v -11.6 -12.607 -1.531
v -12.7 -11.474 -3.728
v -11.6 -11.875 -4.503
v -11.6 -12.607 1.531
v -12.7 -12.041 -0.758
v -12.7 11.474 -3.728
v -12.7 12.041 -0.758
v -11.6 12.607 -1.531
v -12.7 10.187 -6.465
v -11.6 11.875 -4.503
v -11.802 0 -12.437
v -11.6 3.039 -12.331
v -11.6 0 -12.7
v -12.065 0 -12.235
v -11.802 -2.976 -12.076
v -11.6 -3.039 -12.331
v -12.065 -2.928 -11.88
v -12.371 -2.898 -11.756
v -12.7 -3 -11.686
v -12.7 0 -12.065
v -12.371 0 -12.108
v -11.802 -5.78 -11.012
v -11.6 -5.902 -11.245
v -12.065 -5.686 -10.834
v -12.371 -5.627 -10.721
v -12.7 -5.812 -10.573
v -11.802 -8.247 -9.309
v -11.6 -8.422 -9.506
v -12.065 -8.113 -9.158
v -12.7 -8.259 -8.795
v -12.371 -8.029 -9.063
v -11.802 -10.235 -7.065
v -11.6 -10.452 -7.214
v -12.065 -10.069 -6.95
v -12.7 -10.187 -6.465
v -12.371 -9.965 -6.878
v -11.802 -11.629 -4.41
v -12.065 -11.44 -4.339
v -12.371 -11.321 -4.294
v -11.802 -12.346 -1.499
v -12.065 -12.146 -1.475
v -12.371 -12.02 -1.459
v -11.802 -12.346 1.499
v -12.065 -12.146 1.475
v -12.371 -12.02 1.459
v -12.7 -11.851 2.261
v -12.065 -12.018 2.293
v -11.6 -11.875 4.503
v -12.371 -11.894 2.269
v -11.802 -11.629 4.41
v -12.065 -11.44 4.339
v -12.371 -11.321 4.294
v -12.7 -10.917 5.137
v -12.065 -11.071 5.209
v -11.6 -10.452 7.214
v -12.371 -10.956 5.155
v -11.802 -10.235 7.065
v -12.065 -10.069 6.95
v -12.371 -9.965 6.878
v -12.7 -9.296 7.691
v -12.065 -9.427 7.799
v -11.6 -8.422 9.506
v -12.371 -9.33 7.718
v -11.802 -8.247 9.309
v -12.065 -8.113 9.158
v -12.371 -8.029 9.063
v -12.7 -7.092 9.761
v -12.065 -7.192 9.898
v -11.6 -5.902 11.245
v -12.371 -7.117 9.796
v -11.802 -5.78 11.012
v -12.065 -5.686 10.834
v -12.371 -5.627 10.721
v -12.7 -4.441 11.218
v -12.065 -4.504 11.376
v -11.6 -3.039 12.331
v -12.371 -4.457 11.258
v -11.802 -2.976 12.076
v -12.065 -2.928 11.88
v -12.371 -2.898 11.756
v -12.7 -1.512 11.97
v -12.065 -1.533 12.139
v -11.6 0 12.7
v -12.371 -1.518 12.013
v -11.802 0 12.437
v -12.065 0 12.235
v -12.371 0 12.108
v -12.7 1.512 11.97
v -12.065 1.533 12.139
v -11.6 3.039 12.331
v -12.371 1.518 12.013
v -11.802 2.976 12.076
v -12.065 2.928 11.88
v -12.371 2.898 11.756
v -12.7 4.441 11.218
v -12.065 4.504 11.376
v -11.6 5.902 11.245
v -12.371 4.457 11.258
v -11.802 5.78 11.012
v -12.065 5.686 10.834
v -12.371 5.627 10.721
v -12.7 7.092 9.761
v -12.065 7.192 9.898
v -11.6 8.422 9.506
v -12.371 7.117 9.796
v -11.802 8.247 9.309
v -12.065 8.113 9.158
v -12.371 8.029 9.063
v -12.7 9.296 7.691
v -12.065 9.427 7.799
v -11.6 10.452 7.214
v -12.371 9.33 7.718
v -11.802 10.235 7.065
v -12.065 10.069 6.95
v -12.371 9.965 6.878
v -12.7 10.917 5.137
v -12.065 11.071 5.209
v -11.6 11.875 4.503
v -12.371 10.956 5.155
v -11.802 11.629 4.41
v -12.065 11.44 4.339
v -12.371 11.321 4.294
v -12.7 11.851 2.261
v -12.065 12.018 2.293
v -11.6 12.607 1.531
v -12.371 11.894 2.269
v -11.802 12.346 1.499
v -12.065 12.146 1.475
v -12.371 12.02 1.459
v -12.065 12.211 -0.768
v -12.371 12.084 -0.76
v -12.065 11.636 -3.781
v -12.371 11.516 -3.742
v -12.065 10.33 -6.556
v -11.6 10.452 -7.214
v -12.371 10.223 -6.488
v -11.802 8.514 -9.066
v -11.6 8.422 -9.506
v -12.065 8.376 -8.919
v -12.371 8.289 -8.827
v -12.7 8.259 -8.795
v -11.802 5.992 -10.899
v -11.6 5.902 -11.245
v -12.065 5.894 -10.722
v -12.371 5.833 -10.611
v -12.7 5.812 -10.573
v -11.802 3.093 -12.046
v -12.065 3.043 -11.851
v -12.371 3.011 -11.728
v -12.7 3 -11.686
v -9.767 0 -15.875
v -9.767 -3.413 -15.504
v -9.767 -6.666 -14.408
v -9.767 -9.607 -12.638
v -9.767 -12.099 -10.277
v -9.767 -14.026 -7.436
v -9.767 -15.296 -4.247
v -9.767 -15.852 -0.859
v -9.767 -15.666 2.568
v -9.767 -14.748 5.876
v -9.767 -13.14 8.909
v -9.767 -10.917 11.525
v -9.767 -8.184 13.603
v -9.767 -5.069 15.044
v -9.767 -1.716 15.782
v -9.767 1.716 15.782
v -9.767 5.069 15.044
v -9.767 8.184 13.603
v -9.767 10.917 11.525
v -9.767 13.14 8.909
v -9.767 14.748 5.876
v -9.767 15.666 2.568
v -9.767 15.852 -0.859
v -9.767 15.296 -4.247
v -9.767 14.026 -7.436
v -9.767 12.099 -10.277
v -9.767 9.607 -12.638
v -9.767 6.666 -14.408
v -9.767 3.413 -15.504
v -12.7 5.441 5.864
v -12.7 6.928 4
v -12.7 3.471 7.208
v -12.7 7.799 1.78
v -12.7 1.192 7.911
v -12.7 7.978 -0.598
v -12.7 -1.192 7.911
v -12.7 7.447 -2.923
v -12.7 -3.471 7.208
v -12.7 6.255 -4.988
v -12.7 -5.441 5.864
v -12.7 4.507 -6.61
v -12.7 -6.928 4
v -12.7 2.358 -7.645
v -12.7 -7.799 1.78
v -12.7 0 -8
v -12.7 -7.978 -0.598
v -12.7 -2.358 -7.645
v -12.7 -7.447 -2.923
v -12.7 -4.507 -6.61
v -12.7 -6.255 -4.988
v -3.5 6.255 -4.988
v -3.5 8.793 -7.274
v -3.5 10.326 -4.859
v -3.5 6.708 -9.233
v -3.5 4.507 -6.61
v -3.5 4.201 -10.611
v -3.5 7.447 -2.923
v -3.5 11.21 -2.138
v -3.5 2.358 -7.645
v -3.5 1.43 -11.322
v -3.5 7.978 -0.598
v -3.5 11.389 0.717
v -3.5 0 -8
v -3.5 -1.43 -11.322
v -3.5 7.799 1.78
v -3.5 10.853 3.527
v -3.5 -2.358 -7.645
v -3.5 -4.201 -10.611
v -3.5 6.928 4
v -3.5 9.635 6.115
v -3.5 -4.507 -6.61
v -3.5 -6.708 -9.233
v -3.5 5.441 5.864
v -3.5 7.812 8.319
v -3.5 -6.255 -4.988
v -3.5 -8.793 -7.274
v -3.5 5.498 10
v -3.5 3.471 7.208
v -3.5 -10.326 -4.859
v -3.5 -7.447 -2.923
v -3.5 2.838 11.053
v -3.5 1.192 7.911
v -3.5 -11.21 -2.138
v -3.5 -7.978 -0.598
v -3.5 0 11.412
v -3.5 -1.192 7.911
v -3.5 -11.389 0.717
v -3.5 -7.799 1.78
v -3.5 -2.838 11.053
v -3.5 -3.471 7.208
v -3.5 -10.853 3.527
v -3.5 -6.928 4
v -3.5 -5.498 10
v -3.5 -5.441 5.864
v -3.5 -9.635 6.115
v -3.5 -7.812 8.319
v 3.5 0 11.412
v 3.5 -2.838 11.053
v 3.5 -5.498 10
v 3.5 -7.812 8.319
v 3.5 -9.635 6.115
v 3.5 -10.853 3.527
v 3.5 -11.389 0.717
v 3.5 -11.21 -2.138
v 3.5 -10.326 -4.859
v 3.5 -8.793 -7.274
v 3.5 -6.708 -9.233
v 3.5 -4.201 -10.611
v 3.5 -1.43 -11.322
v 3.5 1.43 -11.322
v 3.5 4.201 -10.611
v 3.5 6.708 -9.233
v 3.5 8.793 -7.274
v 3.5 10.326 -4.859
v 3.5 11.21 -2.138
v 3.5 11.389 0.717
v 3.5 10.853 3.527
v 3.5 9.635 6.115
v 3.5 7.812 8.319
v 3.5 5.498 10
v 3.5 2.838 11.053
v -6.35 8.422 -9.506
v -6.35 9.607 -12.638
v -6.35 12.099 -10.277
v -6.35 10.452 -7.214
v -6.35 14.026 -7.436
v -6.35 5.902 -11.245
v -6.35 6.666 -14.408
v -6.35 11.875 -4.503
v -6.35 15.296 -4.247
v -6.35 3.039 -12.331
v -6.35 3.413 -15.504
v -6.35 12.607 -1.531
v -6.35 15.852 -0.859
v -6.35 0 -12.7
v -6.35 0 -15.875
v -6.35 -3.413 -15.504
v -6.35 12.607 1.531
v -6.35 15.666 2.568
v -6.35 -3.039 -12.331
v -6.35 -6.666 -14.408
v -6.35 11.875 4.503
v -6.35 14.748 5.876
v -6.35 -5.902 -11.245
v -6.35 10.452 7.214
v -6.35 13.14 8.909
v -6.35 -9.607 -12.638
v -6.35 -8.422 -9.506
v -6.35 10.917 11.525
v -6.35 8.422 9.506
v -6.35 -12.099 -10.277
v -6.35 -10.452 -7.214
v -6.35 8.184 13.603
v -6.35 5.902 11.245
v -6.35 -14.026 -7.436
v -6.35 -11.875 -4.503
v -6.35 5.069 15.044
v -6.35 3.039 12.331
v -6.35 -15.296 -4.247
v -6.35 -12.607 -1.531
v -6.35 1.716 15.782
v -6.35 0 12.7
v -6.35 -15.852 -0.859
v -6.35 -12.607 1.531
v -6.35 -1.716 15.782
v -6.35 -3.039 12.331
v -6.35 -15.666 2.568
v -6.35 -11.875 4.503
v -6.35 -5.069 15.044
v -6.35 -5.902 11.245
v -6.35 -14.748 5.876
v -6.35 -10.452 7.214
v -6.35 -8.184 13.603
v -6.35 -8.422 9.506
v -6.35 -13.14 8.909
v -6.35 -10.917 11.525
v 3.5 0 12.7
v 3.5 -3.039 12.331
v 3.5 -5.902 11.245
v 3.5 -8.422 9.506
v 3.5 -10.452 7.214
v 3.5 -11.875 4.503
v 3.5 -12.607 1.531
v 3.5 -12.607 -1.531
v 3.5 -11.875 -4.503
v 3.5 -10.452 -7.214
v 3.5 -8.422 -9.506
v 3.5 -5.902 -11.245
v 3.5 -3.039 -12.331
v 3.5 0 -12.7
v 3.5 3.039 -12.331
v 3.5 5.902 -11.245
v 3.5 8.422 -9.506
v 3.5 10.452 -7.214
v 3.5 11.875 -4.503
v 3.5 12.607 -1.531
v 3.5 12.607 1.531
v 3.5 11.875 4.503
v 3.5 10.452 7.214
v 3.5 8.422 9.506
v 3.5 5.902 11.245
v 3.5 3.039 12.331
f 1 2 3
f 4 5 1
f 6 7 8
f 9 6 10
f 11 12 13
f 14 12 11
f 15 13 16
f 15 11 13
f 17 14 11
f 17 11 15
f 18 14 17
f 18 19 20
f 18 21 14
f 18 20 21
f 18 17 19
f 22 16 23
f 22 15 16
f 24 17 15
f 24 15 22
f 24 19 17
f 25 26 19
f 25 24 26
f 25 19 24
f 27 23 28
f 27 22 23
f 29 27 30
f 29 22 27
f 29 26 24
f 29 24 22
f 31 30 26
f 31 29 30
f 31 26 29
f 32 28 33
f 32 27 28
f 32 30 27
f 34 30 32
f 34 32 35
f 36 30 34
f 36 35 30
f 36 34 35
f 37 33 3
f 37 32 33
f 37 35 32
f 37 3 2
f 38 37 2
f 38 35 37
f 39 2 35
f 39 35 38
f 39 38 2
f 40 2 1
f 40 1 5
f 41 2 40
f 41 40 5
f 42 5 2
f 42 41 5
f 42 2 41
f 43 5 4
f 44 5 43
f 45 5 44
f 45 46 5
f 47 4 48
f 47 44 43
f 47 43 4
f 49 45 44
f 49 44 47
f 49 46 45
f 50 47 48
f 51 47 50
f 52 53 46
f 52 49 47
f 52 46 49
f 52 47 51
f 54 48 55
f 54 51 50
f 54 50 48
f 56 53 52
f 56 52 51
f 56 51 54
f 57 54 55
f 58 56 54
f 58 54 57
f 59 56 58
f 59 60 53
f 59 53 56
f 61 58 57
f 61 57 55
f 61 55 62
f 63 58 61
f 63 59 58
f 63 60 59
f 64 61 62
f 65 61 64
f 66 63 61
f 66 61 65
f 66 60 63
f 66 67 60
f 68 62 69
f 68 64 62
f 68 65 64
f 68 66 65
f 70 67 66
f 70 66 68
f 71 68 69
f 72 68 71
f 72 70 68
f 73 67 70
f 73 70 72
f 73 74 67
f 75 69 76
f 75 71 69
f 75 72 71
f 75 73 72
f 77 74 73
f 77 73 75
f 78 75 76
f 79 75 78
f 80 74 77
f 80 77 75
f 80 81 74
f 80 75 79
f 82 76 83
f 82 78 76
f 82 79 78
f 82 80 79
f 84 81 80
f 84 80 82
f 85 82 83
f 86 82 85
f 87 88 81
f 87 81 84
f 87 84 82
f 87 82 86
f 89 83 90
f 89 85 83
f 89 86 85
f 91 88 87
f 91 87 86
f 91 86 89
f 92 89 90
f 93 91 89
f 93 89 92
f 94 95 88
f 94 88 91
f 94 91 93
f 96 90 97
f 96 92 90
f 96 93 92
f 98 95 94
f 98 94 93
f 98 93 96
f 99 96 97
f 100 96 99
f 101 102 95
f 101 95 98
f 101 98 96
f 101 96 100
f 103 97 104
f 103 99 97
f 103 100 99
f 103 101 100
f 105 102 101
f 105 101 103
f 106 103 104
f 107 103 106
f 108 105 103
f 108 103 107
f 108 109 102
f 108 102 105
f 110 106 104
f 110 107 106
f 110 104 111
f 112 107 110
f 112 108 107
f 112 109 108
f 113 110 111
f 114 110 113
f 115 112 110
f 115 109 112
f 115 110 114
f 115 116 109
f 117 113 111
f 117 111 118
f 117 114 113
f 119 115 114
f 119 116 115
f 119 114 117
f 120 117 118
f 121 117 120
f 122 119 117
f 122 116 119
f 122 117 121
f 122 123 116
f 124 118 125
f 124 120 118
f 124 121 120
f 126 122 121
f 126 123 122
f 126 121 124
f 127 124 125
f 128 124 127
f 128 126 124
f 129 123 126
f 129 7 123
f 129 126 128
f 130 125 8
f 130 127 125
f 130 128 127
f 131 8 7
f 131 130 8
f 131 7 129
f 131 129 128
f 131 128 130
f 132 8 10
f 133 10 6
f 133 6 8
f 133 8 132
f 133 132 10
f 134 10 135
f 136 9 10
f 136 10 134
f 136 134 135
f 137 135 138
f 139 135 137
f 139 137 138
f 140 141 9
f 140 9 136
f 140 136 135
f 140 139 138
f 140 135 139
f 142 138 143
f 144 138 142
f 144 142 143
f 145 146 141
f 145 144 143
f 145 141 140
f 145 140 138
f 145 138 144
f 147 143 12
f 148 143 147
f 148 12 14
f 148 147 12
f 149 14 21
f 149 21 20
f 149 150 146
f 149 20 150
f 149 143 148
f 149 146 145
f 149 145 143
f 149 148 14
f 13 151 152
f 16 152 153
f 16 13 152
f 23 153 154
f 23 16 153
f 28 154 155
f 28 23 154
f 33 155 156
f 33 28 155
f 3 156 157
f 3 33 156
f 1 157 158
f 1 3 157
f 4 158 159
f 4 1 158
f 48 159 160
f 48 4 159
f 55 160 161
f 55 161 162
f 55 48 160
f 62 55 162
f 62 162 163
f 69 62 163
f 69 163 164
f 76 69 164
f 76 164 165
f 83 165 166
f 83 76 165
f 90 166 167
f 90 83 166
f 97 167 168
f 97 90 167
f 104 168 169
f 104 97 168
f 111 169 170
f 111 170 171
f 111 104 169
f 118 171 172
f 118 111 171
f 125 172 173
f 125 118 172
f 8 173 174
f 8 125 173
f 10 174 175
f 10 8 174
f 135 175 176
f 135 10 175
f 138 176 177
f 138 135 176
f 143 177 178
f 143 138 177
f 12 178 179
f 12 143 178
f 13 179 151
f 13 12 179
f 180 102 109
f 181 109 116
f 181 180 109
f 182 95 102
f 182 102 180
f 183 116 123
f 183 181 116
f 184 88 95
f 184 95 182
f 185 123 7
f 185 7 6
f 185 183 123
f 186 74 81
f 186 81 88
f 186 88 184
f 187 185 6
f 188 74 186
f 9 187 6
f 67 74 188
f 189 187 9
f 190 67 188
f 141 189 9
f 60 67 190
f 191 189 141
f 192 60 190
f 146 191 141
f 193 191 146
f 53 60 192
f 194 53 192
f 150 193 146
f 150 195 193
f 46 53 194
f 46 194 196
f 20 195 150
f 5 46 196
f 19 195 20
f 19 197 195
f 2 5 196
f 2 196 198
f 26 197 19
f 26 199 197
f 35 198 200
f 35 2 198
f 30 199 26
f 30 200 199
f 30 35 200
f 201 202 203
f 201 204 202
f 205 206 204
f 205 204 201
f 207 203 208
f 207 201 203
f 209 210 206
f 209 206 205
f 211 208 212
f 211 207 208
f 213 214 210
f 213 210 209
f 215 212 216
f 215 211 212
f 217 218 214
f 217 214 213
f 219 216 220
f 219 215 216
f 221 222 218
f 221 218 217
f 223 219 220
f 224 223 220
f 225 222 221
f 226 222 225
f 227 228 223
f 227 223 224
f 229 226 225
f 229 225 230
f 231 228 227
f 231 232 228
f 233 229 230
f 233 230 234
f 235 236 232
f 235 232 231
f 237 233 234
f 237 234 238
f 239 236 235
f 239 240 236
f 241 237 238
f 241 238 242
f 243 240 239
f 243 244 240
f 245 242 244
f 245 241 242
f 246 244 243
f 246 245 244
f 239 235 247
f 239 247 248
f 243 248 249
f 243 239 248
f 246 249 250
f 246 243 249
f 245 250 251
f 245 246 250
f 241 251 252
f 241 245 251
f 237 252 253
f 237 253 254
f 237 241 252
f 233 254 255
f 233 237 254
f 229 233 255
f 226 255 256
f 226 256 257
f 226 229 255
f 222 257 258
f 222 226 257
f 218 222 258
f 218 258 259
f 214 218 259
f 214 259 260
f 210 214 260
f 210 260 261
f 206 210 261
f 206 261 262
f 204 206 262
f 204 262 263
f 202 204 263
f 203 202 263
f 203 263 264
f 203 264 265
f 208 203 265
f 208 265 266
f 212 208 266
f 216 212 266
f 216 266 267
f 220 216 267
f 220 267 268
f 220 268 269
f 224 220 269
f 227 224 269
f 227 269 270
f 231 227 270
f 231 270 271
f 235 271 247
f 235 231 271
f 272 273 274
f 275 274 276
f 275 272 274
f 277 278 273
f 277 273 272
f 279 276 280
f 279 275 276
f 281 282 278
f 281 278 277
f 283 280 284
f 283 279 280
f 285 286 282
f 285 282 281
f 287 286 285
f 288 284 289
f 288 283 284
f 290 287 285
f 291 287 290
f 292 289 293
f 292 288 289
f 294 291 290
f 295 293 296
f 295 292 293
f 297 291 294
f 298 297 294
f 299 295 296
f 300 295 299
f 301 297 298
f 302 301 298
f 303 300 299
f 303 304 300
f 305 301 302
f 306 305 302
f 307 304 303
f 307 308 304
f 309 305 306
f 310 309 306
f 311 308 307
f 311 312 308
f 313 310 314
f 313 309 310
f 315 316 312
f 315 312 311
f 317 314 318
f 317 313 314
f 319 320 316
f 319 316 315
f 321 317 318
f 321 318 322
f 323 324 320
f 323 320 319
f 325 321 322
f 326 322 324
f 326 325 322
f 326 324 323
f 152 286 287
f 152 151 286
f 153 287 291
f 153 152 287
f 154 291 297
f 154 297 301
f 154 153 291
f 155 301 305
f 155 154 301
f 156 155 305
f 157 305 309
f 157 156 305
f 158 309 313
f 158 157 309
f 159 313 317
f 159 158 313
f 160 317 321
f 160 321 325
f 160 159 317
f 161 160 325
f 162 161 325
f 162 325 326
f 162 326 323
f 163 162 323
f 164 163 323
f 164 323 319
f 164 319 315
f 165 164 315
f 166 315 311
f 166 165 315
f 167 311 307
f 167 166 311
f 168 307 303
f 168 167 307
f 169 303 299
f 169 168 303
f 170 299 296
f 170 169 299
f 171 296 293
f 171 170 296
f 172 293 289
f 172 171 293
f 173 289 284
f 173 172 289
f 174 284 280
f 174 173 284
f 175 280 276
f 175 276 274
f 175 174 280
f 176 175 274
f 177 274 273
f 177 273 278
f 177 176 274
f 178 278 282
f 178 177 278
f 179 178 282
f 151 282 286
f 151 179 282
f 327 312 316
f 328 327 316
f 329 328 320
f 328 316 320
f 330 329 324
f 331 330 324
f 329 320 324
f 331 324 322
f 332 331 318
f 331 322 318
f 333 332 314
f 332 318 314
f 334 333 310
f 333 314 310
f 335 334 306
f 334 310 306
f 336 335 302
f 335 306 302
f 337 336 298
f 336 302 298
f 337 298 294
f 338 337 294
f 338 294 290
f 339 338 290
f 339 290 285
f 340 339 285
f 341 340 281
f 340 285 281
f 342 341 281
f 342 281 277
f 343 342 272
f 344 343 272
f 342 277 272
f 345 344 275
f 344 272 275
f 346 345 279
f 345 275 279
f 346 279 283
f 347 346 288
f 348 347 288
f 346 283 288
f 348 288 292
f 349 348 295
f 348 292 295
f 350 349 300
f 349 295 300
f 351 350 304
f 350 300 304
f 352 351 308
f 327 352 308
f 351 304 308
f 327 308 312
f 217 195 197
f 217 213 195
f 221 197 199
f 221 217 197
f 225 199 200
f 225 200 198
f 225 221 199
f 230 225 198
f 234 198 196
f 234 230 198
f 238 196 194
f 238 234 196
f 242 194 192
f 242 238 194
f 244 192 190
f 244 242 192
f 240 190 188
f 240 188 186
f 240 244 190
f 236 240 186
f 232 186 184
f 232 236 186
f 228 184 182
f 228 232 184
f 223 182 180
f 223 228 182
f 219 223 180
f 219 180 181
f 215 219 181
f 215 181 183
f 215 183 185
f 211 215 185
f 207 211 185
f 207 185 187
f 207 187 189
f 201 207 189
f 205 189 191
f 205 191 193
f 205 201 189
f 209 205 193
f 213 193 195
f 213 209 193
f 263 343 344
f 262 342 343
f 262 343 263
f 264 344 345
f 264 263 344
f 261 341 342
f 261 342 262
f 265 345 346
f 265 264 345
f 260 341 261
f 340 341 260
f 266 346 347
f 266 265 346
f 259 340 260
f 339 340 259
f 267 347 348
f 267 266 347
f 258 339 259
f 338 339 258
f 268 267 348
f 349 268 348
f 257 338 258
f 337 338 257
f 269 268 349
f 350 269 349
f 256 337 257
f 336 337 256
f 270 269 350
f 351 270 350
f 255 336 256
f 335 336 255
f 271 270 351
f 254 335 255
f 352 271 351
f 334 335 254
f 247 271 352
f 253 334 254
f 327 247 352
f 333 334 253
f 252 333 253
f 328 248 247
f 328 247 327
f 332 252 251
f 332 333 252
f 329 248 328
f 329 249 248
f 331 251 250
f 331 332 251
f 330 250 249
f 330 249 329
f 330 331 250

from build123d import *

# Parameters (mm, degrees)
SKETCH2_R           = 12.7
SKETCH2_R_2         = 11.412
BOSS_EXTRUDE1_DEPTH = 9.85


with BuildPart() as part:
    # Sketch1 → Revolve1 (revolve)
    with BuildSketch(Plane.XY, mode=Mode.PRIVATE) as revolve1_sk:
        with BuildLine():
            Line((-3.5, 8), (-3.5, 11.412))
            Line((-3.5, 11.412), (-6.35, 11.412))
            Line((-6.35, 11.412), (-6.35, 15.875))
            Line((-6.35, 15.875), (-9.767060633, 15.875))
            Line((-9.767060633, 15.875), (-11.600147737, 12.7))
            ThreePointArc((-11.600147737, 12.7), (-12.065, 12.235147737), (-12.7, 12.065))
            Line((-12.7, 12.065), (-12.7, 8))
            Line((-12.7, 8), (-3.5, 8))
        make_face()
    revolve(revolve1_sk.sketch.rotate(Axis((0, 0, 0), (-1, 0, 0)), 90), axis=Axis((0, 0, 0), (-1, 0, 0)))

    # Sketch2 → Boss-Extrude1 (add)
    with BuildSketch(Plane(origin=(-6.35, 0, 0), x_dir=(0, 0, -1), z_dir=(1, 0, 0))):
        with Locations(Location((0, 0, 0), (0, 0, 180))):
            Circle(SKETCH2_R)
        with Locations(Location((0, 0, 0), (0, 0, 180))):
            Circle(SKETCH2_R_2, mode=Mode.SUBTRACT)
    extrude(amount=BOSS_EXTRUDE1_DEPTH)


solid = part.part
